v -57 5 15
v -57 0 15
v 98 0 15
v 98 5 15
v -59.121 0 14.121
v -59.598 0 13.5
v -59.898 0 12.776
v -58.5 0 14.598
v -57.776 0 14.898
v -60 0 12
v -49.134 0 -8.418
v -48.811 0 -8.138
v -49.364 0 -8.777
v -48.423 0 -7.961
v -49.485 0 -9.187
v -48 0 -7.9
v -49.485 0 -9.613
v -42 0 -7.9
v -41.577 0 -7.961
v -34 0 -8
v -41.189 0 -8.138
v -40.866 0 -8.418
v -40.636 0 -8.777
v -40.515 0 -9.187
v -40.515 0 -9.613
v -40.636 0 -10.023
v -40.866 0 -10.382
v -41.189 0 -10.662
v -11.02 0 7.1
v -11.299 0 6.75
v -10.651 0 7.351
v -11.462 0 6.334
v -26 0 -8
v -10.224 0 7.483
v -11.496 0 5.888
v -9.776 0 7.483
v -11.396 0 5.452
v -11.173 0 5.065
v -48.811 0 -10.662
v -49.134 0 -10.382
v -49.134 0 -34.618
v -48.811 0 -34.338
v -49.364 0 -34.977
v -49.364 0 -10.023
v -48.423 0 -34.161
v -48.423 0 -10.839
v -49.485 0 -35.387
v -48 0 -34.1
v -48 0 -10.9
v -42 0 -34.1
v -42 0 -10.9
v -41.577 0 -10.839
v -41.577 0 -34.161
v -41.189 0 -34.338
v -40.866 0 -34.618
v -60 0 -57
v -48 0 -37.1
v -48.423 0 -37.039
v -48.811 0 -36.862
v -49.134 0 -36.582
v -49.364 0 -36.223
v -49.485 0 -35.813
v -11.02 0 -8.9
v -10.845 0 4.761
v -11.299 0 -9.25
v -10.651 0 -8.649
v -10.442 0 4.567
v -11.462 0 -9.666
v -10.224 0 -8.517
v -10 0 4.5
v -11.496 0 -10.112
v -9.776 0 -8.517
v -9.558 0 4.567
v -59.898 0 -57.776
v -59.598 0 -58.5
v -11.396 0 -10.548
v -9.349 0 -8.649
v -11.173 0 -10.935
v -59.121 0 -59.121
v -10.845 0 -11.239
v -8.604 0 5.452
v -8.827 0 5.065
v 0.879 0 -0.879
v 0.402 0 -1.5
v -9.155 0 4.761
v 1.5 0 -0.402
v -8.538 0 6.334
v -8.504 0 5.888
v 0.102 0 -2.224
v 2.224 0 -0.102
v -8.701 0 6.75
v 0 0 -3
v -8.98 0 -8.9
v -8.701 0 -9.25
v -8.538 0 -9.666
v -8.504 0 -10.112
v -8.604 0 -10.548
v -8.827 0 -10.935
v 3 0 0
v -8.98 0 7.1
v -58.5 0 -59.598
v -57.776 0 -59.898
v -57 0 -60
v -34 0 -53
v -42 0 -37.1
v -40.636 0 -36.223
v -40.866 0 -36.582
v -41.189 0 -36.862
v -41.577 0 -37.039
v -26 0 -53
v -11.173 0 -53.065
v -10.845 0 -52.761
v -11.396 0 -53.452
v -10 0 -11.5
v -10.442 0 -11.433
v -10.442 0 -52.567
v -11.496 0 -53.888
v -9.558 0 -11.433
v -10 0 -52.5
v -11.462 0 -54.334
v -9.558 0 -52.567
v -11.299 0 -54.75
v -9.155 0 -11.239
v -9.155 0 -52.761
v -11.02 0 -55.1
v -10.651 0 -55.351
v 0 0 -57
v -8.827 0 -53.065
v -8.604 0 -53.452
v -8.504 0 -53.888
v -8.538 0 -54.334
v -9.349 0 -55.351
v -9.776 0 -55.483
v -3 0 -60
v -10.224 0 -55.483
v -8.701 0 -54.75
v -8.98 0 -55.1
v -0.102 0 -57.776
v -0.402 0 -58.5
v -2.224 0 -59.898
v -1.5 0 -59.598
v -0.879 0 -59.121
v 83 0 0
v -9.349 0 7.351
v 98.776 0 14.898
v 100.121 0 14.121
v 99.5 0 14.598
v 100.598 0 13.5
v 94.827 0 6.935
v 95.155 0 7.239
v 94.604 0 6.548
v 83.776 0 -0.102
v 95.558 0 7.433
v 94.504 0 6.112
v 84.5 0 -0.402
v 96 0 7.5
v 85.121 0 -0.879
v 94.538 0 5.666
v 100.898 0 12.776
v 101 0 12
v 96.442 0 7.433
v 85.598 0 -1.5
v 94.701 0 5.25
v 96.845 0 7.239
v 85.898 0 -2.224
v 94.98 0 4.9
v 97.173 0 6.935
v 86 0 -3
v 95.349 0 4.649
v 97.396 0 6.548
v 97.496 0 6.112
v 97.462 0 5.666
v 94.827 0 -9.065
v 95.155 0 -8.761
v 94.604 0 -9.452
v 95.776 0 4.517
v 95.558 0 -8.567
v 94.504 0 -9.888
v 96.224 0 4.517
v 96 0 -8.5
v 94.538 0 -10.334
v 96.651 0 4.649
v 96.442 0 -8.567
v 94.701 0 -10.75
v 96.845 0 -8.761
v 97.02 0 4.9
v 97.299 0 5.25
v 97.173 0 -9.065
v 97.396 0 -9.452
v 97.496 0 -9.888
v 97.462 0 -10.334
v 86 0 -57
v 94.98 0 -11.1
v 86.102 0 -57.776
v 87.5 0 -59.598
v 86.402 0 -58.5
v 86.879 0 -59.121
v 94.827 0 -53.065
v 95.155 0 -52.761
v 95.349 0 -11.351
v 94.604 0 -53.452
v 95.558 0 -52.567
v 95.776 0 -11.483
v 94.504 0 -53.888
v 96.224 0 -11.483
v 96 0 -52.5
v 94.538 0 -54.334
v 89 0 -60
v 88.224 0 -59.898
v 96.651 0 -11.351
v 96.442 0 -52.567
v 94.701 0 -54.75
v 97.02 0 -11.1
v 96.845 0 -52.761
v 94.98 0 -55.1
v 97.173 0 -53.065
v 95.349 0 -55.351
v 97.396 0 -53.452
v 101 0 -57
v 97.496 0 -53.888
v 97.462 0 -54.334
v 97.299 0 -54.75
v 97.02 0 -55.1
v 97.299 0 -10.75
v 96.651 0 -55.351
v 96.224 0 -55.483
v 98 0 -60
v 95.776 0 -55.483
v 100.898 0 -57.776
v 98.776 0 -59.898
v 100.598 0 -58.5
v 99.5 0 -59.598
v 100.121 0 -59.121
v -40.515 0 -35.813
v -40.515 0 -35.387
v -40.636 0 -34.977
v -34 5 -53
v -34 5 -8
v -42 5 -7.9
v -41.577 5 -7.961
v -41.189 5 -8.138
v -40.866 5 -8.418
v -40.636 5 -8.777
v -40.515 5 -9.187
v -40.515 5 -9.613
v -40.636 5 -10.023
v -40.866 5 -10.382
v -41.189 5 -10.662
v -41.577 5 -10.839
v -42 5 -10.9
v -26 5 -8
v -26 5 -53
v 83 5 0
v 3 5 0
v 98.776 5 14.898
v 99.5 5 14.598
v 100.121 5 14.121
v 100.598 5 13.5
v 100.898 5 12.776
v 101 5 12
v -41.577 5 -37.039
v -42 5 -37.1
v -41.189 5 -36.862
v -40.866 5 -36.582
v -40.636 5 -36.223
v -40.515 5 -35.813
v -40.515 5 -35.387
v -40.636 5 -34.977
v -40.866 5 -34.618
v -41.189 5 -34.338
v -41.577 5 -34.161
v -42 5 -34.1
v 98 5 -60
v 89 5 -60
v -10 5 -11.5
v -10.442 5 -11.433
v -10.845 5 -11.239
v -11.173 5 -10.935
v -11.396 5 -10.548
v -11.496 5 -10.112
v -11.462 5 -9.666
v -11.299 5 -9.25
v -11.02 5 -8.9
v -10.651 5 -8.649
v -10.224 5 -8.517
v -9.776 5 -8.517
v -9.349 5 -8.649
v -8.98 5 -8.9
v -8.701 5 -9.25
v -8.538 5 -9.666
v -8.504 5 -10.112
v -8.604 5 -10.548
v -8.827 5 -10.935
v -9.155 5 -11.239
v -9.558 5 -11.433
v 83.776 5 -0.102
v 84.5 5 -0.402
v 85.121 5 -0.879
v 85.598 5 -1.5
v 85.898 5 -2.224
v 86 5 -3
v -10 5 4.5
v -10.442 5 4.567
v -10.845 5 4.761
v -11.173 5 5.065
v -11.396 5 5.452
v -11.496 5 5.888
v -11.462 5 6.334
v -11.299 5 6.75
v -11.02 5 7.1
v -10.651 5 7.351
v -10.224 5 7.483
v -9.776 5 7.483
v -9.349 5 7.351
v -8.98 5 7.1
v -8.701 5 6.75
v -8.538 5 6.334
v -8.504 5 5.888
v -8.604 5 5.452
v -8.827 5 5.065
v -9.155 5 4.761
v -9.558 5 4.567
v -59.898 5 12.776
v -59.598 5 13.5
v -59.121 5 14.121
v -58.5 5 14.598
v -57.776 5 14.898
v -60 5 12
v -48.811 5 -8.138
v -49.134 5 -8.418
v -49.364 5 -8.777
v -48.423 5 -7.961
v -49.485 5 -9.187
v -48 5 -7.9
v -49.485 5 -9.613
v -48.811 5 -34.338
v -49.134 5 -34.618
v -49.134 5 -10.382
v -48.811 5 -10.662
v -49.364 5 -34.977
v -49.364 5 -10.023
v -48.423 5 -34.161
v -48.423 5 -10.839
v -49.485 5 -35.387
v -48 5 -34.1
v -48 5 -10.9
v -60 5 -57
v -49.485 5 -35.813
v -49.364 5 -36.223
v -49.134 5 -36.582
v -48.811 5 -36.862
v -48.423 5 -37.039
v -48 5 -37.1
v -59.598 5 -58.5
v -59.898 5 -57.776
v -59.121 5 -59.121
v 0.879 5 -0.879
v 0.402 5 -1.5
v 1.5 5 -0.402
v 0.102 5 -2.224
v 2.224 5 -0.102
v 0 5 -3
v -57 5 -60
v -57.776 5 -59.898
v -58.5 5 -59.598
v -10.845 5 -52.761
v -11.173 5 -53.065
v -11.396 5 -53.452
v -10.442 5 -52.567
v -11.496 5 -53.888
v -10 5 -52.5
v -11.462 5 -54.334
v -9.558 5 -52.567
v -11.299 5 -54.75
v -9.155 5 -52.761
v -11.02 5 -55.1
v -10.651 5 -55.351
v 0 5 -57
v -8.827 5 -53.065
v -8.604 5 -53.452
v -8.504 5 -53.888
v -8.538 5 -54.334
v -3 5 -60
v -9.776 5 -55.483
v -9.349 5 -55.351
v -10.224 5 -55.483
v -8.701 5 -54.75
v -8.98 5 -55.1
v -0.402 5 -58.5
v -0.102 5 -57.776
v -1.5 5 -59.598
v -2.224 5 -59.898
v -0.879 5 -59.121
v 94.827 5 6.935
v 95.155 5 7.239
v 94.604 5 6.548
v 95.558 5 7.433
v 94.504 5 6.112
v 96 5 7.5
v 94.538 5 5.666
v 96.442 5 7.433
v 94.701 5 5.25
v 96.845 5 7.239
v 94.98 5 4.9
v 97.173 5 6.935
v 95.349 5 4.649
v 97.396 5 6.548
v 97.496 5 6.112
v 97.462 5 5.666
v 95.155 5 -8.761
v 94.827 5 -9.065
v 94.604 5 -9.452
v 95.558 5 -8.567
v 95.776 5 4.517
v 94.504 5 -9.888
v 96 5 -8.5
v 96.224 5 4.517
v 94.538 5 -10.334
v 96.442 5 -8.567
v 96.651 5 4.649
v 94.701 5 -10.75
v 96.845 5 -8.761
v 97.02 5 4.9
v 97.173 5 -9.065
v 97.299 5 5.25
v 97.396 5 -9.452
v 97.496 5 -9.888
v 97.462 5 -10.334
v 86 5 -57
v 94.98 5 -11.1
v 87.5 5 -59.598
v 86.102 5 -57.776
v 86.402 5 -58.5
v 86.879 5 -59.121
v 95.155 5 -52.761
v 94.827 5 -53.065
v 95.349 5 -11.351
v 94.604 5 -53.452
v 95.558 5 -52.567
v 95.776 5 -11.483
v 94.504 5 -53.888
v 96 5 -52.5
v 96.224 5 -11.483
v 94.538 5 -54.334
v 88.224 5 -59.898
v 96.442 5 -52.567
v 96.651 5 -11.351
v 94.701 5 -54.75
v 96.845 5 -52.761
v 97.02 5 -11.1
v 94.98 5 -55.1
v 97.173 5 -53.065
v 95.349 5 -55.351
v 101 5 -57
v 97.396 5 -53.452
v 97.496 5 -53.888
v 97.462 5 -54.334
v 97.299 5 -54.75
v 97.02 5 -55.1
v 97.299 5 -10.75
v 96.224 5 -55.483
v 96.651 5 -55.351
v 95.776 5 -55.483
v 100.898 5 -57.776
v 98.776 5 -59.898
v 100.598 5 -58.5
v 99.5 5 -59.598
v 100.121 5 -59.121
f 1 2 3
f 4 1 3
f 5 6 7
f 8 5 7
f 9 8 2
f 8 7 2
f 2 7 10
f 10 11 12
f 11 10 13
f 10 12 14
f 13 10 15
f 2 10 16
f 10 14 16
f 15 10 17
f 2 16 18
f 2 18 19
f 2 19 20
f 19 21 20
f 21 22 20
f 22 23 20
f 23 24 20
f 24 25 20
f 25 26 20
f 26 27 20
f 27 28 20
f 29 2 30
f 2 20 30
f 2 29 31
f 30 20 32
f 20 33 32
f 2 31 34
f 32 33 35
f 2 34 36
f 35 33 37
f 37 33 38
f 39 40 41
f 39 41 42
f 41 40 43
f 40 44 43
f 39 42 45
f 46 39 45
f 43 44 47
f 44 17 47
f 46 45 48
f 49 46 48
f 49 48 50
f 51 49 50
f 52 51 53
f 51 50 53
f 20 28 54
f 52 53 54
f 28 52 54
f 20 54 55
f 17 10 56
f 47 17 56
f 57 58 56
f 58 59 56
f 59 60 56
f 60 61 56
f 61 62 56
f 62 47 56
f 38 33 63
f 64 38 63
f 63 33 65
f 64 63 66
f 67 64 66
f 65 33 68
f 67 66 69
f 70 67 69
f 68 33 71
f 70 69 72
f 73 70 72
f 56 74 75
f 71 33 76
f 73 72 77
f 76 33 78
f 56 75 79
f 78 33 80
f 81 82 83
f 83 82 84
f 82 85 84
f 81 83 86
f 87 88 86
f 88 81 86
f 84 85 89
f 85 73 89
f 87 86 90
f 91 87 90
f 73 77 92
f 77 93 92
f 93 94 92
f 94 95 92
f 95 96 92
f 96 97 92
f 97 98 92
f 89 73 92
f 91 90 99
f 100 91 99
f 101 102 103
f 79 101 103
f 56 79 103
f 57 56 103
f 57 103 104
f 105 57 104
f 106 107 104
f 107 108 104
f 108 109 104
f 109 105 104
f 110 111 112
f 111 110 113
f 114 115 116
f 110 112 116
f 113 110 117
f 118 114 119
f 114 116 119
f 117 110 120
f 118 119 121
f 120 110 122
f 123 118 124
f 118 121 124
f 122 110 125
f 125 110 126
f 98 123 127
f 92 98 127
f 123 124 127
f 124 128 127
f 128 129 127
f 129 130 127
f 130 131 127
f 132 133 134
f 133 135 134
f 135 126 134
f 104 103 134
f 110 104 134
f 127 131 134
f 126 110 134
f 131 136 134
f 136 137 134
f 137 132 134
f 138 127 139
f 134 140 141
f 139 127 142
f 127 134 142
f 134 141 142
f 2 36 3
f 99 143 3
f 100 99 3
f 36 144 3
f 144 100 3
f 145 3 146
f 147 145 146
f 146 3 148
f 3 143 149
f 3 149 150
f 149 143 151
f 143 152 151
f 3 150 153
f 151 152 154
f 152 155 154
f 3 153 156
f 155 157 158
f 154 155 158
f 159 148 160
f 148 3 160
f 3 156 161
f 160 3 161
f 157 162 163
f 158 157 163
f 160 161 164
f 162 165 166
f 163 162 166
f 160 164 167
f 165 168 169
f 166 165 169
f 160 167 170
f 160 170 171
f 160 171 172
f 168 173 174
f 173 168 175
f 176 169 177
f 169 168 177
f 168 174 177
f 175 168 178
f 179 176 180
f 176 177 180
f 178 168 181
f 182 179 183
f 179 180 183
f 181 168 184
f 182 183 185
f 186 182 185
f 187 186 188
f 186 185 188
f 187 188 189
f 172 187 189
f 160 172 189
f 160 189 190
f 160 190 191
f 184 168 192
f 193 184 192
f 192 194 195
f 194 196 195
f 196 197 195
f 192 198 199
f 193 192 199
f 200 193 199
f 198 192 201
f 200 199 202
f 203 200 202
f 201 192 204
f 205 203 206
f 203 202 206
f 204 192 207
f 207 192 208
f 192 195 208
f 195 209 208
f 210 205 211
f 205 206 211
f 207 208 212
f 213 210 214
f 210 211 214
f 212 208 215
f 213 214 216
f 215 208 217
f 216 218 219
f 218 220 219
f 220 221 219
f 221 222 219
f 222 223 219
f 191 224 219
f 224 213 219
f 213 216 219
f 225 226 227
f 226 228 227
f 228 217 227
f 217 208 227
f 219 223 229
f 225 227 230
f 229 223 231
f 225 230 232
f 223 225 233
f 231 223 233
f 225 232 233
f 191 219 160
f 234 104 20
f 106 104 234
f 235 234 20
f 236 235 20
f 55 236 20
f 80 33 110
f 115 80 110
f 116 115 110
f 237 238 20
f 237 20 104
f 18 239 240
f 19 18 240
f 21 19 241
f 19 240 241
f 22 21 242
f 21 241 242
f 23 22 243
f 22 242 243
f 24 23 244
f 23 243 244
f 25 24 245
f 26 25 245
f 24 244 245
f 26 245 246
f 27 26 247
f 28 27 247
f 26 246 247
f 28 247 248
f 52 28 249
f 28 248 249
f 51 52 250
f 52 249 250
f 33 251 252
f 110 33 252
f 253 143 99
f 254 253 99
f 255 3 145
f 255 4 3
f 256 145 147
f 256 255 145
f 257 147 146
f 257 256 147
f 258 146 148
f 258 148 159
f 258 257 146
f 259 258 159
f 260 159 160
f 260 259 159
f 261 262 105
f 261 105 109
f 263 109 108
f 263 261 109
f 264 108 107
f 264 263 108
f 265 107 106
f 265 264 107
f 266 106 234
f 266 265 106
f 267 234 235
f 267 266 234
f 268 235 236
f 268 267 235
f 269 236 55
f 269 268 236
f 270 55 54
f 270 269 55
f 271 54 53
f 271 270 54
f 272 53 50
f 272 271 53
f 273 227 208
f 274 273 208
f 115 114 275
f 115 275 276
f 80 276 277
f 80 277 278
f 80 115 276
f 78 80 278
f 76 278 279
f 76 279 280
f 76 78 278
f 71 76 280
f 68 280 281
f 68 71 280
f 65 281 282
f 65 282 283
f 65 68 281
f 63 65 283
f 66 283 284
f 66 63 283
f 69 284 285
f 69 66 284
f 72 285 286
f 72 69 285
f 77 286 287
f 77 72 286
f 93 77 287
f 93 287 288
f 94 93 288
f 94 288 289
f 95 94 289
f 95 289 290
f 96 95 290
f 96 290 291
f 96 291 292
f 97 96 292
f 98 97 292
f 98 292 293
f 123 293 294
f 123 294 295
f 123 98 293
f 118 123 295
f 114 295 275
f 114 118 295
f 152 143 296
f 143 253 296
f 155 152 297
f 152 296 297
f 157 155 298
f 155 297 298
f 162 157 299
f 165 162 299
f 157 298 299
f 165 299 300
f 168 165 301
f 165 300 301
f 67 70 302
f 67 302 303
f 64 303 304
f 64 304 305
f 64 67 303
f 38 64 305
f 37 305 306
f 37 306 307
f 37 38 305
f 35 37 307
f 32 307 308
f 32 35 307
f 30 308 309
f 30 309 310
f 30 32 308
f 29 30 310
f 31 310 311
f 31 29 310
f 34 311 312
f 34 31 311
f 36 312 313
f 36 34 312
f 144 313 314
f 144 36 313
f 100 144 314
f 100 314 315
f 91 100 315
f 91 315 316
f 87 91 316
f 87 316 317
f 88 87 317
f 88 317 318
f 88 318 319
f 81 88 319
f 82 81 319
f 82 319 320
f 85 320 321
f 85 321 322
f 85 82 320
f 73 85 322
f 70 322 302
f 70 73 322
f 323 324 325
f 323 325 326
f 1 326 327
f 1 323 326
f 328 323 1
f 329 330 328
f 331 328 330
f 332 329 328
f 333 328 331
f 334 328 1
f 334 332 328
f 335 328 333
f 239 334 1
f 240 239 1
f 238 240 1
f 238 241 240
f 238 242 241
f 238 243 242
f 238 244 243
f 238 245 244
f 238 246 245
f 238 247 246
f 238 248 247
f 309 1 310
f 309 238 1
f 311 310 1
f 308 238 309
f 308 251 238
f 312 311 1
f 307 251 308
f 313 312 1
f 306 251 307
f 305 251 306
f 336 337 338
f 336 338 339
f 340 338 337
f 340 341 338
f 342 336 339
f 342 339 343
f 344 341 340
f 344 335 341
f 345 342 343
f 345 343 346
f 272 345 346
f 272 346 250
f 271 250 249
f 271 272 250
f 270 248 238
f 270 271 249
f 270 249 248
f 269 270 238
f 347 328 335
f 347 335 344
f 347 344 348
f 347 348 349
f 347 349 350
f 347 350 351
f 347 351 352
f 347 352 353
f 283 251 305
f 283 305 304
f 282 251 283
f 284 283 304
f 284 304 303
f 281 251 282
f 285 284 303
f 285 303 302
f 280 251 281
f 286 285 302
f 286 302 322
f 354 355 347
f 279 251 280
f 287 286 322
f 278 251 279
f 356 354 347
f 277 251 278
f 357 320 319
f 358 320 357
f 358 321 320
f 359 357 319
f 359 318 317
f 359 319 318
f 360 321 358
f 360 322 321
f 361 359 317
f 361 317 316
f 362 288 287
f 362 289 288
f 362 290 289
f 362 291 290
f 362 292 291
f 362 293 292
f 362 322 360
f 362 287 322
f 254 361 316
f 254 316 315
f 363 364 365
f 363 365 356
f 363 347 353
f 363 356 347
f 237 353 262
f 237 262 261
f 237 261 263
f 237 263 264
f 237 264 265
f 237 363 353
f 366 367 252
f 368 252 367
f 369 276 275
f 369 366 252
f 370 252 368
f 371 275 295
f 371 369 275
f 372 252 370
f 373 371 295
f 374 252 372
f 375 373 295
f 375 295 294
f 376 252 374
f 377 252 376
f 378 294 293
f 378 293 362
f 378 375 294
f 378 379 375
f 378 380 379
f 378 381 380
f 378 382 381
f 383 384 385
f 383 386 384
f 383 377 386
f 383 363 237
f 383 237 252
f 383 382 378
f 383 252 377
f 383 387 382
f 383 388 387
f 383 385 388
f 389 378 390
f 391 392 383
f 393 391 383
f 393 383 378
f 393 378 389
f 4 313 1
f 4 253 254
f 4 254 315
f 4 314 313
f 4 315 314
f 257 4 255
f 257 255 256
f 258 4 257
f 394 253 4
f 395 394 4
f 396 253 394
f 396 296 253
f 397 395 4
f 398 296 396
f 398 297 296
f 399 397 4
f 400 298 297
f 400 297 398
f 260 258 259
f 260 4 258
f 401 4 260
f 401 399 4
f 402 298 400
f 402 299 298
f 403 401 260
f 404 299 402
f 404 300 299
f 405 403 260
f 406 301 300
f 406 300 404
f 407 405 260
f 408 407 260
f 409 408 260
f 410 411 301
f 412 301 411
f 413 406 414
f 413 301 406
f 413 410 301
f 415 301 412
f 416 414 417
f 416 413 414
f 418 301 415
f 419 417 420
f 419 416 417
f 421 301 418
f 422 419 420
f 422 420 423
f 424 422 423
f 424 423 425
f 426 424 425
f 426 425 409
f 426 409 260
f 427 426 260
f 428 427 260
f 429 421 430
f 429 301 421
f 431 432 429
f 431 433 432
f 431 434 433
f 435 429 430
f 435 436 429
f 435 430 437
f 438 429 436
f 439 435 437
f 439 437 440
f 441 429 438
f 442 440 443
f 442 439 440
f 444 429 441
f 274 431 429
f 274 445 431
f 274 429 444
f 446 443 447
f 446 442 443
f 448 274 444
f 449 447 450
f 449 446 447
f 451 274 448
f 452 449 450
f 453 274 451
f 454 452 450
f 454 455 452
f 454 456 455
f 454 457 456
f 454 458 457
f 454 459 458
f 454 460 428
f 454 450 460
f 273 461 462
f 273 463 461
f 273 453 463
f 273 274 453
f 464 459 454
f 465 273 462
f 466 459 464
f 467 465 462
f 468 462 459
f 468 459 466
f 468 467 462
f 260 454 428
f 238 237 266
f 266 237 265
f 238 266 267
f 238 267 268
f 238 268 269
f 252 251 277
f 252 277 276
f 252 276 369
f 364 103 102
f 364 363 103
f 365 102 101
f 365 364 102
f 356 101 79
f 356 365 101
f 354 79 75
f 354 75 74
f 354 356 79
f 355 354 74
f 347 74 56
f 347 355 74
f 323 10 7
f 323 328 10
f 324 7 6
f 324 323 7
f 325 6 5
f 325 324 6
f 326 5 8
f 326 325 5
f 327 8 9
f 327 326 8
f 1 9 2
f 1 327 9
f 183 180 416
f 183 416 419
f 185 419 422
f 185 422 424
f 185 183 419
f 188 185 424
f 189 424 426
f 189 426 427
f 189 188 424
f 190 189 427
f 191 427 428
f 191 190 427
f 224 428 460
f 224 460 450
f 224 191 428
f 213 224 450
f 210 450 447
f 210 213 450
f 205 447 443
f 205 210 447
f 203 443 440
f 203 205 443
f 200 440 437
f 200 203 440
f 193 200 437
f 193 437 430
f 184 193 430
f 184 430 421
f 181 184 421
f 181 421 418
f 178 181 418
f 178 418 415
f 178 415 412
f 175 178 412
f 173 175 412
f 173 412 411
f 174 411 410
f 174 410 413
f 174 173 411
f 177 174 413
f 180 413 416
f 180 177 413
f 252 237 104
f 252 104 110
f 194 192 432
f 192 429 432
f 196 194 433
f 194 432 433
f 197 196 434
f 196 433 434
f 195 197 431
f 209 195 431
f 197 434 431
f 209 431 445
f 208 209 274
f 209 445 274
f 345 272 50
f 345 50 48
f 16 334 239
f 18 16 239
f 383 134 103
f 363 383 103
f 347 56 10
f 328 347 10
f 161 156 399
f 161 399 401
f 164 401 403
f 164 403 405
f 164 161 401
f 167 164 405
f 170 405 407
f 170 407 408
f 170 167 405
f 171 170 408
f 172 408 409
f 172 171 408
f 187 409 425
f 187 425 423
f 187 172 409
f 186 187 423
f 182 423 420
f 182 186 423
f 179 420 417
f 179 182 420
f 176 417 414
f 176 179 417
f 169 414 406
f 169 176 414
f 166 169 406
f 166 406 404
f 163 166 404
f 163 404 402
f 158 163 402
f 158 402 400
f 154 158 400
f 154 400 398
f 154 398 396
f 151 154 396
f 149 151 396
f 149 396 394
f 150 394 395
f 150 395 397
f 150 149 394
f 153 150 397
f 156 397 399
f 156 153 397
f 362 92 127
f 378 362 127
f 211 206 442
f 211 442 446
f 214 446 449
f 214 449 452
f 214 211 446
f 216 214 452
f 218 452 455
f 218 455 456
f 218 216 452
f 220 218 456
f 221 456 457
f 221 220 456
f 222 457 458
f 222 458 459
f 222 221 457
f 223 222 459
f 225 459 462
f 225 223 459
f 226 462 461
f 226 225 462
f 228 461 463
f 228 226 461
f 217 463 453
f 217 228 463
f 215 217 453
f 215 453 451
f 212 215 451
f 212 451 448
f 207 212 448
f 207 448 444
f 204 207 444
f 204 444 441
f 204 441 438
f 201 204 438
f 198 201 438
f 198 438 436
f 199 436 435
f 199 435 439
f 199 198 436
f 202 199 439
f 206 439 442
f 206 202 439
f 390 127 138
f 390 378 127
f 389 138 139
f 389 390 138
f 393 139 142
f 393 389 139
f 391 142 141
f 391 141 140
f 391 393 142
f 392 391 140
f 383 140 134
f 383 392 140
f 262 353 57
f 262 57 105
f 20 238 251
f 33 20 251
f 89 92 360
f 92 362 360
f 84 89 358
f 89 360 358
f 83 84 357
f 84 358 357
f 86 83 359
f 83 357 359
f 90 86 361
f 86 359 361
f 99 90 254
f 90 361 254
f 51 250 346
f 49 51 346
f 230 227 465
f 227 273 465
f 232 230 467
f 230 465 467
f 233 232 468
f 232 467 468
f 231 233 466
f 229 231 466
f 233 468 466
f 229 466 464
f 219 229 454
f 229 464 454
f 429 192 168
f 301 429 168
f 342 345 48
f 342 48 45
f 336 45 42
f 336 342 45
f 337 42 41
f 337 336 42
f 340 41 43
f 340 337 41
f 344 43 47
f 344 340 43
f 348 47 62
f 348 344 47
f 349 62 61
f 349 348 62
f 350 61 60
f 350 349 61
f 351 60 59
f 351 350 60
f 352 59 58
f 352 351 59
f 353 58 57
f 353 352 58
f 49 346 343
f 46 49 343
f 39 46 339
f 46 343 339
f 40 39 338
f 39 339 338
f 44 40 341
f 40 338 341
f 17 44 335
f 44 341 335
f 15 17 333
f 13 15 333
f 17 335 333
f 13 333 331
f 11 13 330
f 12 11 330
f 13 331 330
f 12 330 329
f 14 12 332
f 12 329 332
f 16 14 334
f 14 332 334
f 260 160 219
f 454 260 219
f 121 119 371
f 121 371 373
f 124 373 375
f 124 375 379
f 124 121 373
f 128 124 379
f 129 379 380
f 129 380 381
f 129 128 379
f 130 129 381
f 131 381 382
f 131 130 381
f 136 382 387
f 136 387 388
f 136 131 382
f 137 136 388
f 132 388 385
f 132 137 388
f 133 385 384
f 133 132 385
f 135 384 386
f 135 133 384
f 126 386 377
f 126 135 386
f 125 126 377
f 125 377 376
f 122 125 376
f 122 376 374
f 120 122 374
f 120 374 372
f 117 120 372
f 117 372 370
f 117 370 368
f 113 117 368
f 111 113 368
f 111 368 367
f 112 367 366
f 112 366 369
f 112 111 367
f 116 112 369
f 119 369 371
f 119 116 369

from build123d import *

# Parameters (mm, degrees)
SKETCH_1_R          = 1.5
EXTRUDE_1_DEPTH     = 5
SKETCH_11_W         = 8
SKETCH_11_H         = 45
CUT_EXTRUDE_6_DEPTH = 118.584012519
FILLET_1_R          = 3
CUT_EXTRUDE_7_DEPTH = 118.584012519


with BuildPart() as part:
    # 草图1 → 凸台-拉伸1 (new body)
    with BuildSketch(Plane(origin=(0, 0, 0), x_dir=(1, 0, 0), z_dir=(0, 1, 0))):
        Polygon((0, 0), (0, 60), (-60, 60), (-60, -15), (101, -15), (101, 60), (86, 60), (86, 0), align=None)
        with Locations(Location((-10, 54, 0), (0, 0, 270))):
            Circle(SKETCH_1_R, mode=Mode.SUBTRACT)
        with Locations(Location((-10, -6, 0), (0, 0, 90))):
            Circle(SKETCH_1_R, mode=Mode.SUBTRACT)
        with Locations(Location((96, 54, 0), (0, 0, 270))):
            Circle(SKETCH_1_R, mode=Mode.SUBTRACT)
        with Locations(Location((96, -6, 0), (0, 0, 270))):
            Circle(SKETCH_1_R, mode=Mode.SUBTRACT)
        with Locations(Location((96, 10, 0), (0, 0, 270))):
            Circle(SKETCH_1_R, mode=Mode.SUBTRACT)
        with Locations(Location((-10, 10, 0), (0, 0, 90))):
            Circle(SKETCH_1_R, mode=Mode.SUBTRACT)
    extrude(amount=EXTRUDE_1_DEPTH)

    # 草图11 → 切除-拉伸6 (cut, through all)
    with BuildSketch(Plane(origin=(0, 5, 0), x_dir=(1, 0, 0), z_dir=(0, 1, 0))):
        with Locations((-30, 30.5)):
            Rectangle(SKETCH_11_W, SKETCH_11_H)
    extrude(amount=-CUT_EXTRUDE_6_DEPTH, mode=Mode.SUBTRACT)

    # 圆角1
    fillet_1_edges = [part.edges().sort_by_distance(p)[0] for p in [
        (86, 2.5, 0),
        (86, 2.5, -60),
        (101, 2.5, -60),
        (101, 2.5, 15),
        (-60, 2.5, 15),
        (-60, 2.5, -60),
        (0, 2.5, -60),
        (0, 2.5, 0),
    ]]
    fillet(fillet_1_edges, radius=FILLET_1_R)

    # 草图12 → 切除-拉伸7 (cut, through all)
    with BuildSketch(Plane(origin=(0, 5, 0), x_dir=(1, 0, 0), z_dir=(0, 1, 0))):
        with BuildLine():
            Line((-48, 37.1), (-42, 37.1))
            ThreePointArc((-42, 37.1), (-40.5, 35.6), (-42, 34.1))
            Line((-42, 34.1), (-48, 34.1))
            ThreePointArc((-48, 34.1), (-49.5, 35.6), (-48, 37.1))
        make_face()
        with BuildLine():
            Line((-48, 7.9), (-42, 7.9))
            ThreePointArc((-42, 7.9), (-40.5, 9.4), (-42, 10.9))
            Line((-42, 10.9), (-48, 10.9))
            ThreePointArc((-48, 10.9), (-49.5, 9.4), (-48, 7.9))
        make_face()
    extrude(amount=-CUT_EXTRUDE_7_DEPTH, mode=Mode.SUBTRACT)


solid = part.part
